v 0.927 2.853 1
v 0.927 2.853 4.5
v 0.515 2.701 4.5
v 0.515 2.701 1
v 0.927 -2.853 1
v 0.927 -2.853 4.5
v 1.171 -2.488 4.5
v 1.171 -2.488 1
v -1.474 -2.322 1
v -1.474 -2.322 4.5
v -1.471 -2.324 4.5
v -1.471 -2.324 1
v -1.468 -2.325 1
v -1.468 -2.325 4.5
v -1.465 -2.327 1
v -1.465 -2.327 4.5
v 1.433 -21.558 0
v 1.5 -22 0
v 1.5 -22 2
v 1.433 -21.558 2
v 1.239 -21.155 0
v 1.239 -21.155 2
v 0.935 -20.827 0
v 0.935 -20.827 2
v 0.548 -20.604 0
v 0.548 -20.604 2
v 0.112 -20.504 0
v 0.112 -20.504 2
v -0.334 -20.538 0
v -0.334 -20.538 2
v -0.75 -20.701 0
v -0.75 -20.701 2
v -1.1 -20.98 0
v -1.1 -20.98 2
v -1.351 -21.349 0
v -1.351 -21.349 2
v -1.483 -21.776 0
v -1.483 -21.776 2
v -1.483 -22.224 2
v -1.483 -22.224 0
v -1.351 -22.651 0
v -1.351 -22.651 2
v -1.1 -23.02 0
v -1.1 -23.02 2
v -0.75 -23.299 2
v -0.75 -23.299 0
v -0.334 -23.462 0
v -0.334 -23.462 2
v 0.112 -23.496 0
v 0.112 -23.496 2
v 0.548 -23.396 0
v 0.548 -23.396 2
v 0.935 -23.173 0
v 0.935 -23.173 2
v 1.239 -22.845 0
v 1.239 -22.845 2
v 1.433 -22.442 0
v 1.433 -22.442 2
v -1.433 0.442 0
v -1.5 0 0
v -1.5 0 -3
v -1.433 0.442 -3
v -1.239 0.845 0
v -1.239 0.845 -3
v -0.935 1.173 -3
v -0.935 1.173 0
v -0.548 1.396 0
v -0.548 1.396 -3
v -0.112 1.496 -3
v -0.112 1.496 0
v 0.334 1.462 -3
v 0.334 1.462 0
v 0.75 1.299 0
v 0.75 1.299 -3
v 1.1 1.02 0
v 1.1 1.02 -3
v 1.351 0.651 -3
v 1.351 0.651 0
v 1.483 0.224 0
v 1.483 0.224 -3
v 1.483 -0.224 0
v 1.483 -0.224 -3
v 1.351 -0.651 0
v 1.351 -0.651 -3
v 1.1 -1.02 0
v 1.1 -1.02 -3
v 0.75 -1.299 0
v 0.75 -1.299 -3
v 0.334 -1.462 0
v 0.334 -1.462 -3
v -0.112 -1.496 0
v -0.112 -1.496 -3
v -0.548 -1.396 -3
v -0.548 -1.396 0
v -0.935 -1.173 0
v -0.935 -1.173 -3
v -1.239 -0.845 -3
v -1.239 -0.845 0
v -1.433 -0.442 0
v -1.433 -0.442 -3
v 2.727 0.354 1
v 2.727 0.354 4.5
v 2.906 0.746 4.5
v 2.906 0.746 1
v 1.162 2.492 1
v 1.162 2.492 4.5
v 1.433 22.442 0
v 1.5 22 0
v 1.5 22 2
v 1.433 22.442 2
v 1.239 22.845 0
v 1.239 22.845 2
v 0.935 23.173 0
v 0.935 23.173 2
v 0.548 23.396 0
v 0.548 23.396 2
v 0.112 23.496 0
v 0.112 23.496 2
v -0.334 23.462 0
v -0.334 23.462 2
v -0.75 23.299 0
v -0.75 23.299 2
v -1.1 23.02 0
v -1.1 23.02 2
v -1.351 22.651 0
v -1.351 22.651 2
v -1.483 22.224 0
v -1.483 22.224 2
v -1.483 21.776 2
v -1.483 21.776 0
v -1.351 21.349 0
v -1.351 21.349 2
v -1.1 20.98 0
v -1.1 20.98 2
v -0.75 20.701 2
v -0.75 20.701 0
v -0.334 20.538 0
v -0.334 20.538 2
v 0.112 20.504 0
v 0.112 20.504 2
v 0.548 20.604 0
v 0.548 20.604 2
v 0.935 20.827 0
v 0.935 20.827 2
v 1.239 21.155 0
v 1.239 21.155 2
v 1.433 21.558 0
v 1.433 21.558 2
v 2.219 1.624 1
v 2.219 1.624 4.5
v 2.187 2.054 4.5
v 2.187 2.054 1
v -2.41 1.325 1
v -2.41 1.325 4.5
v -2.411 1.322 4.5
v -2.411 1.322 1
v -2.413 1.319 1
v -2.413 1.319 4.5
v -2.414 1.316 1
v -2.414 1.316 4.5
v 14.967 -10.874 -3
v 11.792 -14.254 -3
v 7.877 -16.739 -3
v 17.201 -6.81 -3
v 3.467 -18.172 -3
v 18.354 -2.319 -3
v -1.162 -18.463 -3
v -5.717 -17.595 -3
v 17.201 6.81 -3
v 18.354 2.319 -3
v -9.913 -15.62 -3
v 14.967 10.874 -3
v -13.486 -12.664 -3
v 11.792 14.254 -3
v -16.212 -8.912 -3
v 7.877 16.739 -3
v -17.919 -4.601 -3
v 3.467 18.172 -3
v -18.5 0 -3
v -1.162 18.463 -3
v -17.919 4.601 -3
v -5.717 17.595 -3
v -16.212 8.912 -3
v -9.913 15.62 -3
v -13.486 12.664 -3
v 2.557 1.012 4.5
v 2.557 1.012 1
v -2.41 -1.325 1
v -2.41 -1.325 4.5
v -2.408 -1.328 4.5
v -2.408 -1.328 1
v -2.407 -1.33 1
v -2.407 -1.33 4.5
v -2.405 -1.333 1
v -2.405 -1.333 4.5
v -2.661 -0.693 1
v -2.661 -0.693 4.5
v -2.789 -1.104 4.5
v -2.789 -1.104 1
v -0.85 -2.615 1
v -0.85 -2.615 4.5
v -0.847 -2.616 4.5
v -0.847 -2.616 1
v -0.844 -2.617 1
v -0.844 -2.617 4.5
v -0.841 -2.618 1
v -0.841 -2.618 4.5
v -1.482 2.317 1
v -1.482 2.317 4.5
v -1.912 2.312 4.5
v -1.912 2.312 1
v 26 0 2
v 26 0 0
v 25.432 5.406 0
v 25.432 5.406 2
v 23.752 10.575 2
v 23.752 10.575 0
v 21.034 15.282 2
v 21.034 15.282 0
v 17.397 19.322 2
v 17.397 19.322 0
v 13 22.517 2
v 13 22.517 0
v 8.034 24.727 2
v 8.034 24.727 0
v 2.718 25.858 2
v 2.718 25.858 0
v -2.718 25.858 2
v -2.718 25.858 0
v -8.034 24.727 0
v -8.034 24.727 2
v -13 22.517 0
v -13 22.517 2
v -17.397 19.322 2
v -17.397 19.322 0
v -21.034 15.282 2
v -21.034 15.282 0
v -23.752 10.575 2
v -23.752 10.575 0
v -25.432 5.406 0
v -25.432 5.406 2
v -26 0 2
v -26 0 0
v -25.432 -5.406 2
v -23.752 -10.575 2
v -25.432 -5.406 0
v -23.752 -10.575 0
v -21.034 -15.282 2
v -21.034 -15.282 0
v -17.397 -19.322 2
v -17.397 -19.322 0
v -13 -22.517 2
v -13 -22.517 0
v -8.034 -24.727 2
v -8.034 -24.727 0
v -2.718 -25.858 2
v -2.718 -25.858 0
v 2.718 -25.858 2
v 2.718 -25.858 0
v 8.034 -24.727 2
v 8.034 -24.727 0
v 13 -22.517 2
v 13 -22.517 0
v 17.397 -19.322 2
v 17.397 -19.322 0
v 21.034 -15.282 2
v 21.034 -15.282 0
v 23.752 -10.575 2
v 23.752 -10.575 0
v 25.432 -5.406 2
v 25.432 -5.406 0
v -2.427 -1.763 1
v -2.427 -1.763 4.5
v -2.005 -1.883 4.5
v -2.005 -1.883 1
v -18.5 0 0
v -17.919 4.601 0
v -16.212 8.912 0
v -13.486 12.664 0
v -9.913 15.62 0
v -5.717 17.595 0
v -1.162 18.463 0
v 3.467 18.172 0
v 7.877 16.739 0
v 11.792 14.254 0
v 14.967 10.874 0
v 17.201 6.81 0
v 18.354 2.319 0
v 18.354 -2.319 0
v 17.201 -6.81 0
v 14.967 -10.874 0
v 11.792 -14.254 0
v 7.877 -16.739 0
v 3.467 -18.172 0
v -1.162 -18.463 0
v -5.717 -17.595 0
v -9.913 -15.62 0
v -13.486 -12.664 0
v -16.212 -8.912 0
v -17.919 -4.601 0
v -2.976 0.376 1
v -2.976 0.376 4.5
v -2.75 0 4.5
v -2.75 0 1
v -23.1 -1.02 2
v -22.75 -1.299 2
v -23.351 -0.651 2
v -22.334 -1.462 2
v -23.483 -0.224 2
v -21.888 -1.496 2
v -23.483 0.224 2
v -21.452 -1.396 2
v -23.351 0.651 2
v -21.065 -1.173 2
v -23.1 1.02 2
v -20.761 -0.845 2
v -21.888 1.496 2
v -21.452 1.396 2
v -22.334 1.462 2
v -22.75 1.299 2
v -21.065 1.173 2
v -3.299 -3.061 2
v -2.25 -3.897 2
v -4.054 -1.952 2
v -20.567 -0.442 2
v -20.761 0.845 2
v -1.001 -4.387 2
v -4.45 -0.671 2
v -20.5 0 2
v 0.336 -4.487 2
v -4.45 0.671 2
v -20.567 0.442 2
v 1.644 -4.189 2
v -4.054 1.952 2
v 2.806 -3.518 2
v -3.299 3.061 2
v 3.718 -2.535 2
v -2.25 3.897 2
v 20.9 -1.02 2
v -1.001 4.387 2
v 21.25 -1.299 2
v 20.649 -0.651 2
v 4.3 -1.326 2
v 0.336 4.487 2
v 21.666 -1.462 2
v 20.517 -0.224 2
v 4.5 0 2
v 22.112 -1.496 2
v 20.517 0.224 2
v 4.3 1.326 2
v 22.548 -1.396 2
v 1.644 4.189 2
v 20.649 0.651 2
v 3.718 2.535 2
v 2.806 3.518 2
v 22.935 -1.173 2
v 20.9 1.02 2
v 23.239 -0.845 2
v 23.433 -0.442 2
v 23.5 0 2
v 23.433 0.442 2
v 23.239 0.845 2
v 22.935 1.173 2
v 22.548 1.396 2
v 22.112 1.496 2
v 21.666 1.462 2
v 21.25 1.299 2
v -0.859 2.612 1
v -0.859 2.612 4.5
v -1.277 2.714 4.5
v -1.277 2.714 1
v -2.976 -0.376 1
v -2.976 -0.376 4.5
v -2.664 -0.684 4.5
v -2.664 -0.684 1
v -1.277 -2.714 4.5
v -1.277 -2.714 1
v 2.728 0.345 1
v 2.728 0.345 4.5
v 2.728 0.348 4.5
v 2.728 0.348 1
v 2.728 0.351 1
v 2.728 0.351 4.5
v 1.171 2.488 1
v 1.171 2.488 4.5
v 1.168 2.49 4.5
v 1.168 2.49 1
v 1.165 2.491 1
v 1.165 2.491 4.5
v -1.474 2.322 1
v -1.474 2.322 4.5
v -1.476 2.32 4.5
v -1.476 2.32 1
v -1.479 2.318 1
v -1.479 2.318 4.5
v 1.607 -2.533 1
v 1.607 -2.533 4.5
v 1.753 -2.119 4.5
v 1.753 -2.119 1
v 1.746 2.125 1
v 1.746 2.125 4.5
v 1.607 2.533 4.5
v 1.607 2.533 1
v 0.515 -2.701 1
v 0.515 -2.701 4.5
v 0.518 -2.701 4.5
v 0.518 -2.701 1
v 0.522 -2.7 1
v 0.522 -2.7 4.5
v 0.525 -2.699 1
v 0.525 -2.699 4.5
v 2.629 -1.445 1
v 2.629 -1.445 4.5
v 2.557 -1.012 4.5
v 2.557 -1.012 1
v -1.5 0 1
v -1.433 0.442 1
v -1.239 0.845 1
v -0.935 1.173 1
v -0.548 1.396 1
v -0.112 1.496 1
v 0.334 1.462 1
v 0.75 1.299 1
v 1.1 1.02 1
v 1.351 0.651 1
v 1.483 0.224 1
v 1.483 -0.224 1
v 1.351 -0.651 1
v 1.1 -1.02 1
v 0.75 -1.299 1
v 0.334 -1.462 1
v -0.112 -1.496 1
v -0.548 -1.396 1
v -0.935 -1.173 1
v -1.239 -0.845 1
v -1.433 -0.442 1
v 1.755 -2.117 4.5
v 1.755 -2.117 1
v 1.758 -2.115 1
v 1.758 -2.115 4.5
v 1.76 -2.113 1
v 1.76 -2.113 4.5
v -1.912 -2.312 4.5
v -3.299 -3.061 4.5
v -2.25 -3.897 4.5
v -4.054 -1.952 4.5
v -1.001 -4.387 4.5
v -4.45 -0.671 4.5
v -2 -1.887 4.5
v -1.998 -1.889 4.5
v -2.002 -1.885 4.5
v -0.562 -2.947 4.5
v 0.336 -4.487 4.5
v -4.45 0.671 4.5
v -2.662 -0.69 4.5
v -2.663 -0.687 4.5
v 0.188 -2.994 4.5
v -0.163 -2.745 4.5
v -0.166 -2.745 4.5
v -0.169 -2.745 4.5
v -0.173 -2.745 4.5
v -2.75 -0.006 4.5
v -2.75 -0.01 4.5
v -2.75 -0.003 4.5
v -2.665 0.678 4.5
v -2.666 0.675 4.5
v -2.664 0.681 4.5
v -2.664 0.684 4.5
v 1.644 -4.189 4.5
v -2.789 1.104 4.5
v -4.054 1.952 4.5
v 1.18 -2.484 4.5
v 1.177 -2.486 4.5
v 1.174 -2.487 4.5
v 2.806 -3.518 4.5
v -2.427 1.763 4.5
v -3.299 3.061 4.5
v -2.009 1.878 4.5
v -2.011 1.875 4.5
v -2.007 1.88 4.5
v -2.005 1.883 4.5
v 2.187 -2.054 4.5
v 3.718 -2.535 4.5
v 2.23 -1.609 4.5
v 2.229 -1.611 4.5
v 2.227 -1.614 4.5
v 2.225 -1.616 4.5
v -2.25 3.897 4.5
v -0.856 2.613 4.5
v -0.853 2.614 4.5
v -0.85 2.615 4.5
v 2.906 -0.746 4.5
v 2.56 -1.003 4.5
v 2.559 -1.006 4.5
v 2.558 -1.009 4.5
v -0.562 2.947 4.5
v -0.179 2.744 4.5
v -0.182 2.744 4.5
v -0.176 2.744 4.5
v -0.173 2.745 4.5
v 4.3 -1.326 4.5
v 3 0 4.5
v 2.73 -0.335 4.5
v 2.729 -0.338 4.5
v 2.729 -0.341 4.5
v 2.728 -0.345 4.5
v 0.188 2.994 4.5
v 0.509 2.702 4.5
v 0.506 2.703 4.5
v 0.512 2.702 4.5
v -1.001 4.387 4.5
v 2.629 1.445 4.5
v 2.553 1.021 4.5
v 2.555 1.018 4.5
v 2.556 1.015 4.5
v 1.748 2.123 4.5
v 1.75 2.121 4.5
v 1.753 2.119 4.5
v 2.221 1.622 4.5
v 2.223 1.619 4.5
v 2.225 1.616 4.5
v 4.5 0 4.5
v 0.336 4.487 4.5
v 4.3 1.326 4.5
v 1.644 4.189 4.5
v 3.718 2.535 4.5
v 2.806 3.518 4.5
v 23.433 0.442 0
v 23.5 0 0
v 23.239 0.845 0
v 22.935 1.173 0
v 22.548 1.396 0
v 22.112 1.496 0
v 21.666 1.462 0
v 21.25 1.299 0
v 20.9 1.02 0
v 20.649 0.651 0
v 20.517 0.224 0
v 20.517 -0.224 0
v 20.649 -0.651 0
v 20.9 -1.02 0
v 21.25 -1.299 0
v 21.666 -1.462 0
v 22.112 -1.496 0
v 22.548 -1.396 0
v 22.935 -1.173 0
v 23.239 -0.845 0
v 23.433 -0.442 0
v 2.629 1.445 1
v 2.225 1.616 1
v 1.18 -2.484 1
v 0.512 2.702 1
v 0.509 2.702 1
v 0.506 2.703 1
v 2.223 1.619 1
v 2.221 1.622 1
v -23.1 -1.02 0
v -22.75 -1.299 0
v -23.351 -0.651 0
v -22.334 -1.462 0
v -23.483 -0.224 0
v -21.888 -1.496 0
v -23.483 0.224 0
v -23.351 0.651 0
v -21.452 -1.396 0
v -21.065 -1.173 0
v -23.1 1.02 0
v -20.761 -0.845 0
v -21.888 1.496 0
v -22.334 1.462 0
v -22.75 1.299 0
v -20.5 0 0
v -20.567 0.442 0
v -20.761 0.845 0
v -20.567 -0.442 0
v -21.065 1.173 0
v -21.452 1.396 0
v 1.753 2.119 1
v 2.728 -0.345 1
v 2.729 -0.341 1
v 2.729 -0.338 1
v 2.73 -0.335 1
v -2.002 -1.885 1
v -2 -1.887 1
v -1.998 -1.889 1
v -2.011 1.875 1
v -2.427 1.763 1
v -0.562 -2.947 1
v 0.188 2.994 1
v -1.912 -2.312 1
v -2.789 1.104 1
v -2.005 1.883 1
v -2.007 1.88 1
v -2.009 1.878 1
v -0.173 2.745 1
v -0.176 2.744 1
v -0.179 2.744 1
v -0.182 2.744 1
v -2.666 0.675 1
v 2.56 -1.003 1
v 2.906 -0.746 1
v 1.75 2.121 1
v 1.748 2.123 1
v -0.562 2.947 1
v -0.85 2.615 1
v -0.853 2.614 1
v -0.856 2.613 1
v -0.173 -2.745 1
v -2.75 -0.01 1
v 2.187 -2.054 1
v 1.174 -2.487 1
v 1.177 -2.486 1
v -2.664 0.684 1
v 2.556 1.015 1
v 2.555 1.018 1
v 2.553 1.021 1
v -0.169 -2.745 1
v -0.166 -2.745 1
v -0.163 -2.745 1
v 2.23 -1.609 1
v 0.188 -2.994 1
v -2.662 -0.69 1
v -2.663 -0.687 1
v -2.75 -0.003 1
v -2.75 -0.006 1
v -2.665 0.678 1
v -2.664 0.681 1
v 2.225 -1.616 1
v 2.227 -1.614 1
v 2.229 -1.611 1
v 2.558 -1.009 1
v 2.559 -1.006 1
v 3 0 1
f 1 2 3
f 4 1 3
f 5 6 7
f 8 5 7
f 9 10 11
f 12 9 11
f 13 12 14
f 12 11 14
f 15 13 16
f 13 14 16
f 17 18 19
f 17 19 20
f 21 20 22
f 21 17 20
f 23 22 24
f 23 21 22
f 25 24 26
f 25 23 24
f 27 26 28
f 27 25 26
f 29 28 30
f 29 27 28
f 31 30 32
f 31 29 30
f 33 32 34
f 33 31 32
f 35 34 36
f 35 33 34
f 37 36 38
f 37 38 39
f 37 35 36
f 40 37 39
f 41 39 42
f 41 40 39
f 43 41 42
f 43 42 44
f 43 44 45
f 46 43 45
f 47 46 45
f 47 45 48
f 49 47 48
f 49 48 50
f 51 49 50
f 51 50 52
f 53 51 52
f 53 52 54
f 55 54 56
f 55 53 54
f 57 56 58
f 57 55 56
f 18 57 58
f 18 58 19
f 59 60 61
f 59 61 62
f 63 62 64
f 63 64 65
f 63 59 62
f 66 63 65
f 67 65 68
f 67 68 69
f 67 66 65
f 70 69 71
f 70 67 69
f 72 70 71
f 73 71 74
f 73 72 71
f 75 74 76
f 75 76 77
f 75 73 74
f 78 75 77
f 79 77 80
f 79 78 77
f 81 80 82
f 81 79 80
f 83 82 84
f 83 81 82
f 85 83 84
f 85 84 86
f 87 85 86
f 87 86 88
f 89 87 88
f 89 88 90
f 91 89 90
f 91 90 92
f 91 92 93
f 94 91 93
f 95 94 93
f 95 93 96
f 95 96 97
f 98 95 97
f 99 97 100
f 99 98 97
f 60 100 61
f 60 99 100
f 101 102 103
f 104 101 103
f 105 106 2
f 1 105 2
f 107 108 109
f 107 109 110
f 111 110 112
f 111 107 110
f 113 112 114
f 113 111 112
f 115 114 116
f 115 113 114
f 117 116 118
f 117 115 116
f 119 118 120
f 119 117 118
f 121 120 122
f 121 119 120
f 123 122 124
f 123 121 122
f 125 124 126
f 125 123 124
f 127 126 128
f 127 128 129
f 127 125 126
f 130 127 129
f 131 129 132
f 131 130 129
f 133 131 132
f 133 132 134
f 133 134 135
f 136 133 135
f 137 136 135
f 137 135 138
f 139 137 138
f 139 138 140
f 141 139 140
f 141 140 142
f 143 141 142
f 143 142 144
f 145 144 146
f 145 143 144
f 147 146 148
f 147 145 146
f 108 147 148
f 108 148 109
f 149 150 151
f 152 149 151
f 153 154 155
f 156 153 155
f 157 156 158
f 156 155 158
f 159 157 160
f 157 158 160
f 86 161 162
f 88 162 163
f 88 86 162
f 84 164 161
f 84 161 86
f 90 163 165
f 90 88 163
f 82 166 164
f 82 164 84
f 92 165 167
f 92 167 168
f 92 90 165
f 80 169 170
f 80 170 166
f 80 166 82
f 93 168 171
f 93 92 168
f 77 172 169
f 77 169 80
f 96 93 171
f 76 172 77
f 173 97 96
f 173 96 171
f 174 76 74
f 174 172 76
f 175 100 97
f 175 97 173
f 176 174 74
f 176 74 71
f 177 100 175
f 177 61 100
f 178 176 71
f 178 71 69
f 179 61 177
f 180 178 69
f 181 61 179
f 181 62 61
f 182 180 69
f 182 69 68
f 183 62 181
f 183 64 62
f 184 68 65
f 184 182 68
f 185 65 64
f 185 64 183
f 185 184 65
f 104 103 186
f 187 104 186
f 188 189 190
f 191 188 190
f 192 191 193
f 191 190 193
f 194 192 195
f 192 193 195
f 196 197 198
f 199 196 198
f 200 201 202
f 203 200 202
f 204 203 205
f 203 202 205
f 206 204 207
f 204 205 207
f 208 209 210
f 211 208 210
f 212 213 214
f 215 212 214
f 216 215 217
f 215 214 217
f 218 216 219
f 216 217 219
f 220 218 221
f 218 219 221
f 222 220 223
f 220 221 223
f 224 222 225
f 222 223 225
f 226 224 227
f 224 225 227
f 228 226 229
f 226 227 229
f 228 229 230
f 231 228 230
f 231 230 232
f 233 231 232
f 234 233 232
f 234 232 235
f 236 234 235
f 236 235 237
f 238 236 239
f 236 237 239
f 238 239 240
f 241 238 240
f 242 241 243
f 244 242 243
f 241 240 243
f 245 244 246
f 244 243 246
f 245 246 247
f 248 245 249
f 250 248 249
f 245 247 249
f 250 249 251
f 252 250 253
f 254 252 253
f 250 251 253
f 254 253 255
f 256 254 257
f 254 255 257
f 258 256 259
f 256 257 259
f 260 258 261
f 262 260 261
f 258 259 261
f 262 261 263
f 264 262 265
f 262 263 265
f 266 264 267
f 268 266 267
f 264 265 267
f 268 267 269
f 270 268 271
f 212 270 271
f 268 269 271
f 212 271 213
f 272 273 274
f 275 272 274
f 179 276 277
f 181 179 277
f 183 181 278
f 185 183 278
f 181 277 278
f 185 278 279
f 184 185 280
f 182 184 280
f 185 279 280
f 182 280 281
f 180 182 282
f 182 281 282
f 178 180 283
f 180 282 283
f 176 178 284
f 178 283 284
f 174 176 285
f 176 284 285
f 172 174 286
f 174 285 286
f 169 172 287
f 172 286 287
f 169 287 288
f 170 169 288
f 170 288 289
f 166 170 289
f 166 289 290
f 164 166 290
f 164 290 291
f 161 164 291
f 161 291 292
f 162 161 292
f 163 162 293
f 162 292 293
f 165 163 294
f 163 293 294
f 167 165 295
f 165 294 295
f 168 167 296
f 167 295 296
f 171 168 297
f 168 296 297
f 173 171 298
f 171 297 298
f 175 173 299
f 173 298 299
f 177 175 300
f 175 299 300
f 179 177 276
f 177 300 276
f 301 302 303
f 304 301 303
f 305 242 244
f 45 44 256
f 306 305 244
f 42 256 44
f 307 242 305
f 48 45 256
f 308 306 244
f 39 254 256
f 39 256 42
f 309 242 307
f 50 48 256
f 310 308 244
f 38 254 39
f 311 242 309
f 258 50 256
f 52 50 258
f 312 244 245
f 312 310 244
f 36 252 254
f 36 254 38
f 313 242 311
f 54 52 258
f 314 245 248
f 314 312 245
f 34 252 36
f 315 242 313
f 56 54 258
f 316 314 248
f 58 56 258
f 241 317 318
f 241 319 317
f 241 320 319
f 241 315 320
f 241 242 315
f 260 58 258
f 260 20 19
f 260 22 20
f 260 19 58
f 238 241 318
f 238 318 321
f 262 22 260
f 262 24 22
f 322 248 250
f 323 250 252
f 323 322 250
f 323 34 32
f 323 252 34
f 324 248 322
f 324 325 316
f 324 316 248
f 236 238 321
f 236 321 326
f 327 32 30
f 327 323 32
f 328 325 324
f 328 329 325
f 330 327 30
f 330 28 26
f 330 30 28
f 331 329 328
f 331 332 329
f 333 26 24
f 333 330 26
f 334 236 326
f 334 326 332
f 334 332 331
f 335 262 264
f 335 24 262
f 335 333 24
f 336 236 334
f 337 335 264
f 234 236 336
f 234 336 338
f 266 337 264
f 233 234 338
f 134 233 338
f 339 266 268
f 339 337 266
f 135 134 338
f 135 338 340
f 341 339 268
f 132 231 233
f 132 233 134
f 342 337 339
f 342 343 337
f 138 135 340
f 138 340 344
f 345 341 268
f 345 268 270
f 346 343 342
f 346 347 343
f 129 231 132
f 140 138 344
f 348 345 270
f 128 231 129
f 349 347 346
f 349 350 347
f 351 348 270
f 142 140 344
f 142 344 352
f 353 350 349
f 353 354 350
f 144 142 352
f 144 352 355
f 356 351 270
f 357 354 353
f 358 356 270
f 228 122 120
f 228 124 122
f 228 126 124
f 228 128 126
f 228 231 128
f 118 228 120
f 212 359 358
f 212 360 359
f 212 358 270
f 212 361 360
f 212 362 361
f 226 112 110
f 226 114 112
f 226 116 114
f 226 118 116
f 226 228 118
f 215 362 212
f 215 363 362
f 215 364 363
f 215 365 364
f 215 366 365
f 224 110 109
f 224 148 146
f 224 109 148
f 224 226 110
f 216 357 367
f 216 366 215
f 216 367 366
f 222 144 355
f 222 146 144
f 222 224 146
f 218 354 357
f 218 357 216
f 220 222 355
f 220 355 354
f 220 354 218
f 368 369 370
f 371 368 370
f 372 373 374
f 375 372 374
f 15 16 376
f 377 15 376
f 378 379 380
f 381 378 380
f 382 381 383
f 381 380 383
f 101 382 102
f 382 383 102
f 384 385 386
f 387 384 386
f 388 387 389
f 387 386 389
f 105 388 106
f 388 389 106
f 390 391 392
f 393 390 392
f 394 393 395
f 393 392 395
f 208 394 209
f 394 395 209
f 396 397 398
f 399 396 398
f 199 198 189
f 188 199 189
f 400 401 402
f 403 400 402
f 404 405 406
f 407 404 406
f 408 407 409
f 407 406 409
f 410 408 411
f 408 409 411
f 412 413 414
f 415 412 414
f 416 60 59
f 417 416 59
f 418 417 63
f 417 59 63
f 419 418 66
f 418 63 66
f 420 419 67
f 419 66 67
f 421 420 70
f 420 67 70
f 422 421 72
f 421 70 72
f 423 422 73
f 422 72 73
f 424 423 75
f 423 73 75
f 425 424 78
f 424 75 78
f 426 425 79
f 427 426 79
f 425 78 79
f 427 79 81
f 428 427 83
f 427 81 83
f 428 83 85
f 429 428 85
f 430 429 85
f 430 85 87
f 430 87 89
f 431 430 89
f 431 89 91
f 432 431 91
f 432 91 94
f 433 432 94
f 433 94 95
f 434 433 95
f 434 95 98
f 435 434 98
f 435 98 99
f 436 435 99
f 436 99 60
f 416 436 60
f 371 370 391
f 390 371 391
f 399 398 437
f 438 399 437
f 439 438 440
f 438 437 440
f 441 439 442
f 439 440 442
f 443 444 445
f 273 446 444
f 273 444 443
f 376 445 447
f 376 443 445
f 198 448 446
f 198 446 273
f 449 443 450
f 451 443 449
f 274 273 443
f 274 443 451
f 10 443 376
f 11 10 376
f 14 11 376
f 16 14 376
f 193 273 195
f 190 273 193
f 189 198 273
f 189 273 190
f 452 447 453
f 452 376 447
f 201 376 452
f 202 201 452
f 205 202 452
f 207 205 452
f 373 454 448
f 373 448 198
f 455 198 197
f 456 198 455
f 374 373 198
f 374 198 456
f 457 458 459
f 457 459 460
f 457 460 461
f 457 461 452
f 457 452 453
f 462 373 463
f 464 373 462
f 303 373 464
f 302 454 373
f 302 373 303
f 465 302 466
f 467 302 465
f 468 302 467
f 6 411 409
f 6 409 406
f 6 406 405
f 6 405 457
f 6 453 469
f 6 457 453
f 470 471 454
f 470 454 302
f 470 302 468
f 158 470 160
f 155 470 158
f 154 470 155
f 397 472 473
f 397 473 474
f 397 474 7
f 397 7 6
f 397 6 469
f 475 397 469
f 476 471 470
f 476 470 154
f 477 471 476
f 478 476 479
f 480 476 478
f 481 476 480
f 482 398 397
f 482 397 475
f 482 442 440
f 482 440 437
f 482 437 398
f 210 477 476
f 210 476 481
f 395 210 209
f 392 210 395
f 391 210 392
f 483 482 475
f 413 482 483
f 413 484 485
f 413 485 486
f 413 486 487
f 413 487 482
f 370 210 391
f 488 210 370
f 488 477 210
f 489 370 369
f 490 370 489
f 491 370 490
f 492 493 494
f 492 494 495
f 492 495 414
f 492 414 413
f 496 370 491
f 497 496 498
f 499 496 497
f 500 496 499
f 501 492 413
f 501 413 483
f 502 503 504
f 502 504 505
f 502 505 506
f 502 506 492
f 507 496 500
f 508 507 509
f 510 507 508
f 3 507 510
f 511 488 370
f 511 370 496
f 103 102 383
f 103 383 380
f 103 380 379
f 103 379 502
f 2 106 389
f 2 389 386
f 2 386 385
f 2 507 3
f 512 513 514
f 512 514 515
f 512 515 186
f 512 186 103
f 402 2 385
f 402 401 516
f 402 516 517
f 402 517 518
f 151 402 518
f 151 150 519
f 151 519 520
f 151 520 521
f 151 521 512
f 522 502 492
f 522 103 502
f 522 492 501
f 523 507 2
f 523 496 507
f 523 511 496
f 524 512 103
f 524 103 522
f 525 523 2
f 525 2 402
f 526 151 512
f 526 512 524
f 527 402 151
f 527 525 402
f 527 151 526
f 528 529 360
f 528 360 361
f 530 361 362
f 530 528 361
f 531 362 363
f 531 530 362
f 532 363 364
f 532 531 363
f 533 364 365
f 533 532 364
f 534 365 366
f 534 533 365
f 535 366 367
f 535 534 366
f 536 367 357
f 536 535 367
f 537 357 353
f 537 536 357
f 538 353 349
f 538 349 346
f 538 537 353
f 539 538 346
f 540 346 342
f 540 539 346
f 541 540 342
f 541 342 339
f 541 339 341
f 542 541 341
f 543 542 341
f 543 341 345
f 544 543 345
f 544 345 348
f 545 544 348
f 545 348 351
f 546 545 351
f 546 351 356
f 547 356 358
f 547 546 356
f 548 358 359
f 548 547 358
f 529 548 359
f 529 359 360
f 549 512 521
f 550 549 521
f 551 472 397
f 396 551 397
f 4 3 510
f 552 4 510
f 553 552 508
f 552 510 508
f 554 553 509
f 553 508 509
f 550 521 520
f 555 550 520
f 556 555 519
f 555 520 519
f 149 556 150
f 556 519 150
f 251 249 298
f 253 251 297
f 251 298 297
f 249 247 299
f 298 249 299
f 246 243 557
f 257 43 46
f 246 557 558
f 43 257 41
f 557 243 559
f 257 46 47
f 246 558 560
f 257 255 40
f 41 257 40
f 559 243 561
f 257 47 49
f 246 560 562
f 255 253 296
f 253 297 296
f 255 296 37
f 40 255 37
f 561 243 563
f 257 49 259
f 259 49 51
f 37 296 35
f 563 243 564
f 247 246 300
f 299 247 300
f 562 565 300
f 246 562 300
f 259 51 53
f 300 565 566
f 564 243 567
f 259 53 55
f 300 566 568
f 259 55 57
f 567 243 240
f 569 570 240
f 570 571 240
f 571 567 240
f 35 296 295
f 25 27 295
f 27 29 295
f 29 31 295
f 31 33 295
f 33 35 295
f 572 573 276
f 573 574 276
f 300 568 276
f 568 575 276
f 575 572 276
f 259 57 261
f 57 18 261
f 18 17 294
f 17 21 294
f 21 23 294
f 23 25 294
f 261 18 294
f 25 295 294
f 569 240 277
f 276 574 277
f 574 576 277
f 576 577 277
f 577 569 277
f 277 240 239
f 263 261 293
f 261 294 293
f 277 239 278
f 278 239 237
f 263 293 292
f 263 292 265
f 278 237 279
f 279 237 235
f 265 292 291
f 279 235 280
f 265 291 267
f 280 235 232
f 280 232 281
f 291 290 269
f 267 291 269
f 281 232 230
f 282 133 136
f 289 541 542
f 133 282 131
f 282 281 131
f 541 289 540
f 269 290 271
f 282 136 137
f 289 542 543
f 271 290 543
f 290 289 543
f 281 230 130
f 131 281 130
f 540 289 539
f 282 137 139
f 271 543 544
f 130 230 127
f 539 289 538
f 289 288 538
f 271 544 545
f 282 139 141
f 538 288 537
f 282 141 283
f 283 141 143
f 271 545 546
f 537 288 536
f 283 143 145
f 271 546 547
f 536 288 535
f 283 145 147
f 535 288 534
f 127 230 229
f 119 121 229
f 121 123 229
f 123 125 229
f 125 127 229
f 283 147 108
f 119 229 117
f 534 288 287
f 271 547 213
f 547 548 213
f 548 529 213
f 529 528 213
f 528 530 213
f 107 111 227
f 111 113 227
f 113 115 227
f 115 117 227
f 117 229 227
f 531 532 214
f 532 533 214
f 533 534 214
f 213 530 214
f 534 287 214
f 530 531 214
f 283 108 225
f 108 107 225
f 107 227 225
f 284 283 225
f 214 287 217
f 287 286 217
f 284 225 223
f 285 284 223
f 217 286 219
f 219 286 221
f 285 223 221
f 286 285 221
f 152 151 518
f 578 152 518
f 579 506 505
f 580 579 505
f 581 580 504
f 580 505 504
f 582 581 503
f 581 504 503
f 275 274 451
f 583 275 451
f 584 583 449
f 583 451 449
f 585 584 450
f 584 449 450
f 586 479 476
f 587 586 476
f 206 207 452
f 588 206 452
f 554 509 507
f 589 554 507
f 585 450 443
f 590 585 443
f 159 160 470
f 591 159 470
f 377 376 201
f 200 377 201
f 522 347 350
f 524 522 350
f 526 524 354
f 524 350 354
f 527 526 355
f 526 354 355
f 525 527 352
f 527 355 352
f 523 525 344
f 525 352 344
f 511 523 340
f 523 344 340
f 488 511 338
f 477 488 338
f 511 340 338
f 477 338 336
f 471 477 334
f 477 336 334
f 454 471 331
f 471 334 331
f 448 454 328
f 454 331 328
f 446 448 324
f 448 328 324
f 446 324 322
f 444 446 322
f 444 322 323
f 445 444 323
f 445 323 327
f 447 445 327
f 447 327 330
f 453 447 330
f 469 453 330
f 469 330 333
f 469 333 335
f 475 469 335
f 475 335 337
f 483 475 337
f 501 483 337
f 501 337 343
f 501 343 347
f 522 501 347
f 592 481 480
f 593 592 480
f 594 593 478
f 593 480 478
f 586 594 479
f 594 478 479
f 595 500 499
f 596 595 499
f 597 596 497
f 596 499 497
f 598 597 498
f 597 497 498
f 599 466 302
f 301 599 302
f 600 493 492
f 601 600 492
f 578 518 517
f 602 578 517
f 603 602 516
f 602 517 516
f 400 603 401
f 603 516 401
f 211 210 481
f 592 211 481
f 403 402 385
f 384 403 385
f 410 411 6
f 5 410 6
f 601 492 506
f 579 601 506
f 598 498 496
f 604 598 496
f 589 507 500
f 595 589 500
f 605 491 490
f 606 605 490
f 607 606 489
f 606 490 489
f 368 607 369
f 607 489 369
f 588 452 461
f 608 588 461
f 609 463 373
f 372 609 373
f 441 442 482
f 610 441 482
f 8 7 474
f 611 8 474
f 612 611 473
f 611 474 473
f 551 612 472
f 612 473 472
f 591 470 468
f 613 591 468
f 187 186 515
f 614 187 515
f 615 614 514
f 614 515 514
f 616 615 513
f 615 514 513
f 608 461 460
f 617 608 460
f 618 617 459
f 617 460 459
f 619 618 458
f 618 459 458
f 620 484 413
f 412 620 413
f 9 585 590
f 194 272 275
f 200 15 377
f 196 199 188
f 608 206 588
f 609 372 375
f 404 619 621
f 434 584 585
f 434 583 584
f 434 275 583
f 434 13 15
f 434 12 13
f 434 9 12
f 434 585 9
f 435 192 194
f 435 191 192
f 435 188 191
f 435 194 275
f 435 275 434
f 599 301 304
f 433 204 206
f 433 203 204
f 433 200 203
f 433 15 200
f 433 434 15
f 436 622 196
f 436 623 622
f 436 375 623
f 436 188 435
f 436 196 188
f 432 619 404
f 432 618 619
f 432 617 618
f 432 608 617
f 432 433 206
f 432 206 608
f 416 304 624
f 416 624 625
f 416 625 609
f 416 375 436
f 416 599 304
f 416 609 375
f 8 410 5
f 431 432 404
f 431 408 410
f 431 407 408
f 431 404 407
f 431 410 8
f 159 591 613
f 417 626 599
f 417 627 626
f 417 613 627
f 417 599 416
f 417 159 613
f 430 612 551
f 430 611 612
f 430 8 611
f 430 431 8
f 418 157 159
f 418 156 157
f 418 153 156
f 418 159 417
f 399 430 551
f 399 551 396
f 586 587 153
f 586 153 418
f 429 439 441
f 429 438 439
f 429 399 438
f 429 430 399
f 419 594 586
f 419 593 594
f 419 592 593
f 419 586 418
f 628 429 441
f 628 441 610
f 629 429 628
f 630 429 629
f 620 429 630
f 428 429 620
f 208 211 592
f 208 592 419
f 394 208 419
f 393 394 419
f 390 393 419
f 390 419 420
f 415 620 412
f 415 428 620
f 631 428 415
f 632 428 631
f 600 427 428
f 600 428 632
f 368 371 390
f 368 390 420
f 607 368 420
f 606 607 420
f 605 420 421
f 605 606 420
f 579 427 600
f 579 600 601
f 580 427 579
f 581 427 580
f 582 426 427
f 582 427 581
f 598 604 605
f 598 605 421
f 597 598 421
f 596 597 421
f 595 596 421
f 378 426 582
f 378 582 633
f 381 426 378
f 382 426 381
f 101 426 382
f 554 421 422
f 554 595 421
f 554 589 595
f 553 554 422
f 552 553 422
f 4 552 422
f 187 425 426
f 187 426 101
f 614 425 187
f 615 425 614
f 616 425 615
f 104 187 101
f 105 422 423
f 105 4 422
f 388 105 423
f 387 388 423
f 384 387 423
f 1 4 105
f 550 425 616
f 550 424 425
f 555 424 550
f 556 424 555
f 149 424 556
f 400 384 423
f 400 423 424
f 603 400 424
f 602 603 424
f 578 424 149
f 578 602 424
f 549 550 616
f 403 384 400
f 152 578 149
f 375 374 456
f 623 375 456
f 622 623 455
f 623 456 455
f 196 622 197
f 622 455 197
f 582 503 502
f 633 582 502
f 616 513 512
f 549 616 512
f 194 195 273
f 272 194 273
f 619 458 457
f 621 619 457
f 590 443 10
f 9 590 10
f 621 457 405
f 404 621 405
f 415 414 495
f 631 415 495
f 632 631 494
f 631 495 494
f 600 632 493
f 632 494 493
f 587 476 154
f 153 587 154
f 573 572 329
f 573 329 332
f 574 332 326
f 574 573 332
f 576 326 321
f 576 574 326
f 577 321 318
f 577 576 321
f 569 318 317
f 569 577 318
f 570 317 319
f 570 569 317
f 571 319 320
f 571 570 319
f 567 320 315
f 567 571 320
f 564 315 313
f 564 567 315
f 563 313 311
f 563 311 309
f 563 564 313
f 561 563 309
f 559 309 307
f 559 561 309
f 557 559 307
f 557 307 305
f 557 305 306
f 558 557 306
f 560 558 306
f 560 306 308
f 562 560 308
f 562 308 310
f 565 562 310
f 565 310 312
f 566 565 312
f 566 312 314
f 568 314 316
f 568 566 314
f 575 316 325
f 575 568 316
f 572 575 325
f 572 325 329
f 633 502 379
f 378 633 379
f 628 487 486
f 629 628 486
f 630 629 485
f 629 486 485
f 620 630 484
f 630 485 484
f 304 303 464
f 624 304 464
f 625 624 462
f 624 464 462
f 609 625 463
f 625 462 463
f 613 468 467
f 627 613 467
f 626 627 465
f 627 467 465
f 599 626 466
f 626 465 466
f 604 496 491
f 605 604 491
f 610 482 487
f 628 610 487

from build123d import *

# Parameters (mm, degrees)
SKETCH1_R           = 26
SKETCH1_R_2         = 1.5
SKETCH1_R_3         = 4.5
BOSS_EXTRUDE1_DEPTH = 2
SKETCH1_2_R         = 4.5
BOSS_EXTRUDE2_DEPTH = 4.5
SKETCH2_R           = 1.5
CUT_EXTRUDE1_DEPTH  = 4.5
SKETCH3_R           = 2.75
CUT_EXTRUDE2_DEPTH  = 3.5
CUT_EXTRUDE3_DEPTH  = 3.5
CIRPATTERN1_COUNT   = 25
BOSS_EXTRUDE3_START = 3
SKETCH5_R           = 18.5
SKETCH5_R_2         = 1.5
BOSS_EXTRUDE3_DEPTH = 3


with BuildPart() as part:
    # Sketch1 → Boss-Extrude1 (new body)
    with BuildSketch(Plane.XY):
        Circle(SKETCH1_R)
        with Locations((0, 22)):
            Circle(SKETCH1_R_2, mode=Mode.SUBTRACT)
        with Locations((22, 0)):
            Circle(SKETCH1_R_2, mode=Mode.SUBTRACT)
        with Locations((0, -22)):
            Circle(SKETCH1_R_2, mode=Mode.SUBTRACT)
        with Locations((-22, 0)):
            Circle(SKETCH1_R_2, mode=Mode.SUBTRACT)
        Circle(SKETCH1_R_3, mode=Mode.SUBTRACT)
    extrude(amount=BOSS_EXTRUDE1_DEPTH)

    # Sketch1<2> → Boss-Extrude2 (add)
    with BuildSketch(Plane.XY):
        Circle(SKETCH1_2_R)
    extrude(amount=BOSS_EXTRUDE2_DEPTH)

    # Sketch2 → Cut-Extrude1 (cut)
    with BuildSketch(Plane(origin=(0, 0, 0), x_dir=(-1, 0, 0), z_dir=(0, 0, -1))):
        Circle(SKETCH2_R)
    extrude(amount=-CUT_EXTRUDE1_DEPTH, mode=Mode.SUBTRACT)

    # Sketch3 → Cut-Extrude2 (cut)
    with BuildSketch(Plane.XY.offset(4.5)):
        Circle(SKETCH3_R)
    extrude(amount=-CUT_EXTRUDE2_DEPTH, mode=Mode.SUBTRACT)

    # Sketch4 → Cut-Extrude3 (cut)
    with BuildSketch(Plane.XY.offset(4.5)):
        with BuildLine():
            Line((-2.976344104, 0.375999701), (-2.75, 0))
            ThreePointArc((-2.75, 0), (-2.728912829, 0.339904061), (-2.665974712, 0.674595311))
            Line((-2.665974712, 0.674595311), (-2.976344104, 0.375999701))
        make_face()
    cut_extrude3 = extrude(amount=-CUT_EXTRUDE3_DEPTH, mode=Mode.SUBTRACT)

    # CirPattern1: Cut-Extrude3 ×25 about axis
    cirpattern1_axis = Axis((0, 0, 4.5), (0, 0, -1))
    for i in range(1, CIRPATTERN1_COUNT):
        add(cut_extrude3.rotate(cirpattern1_axis, i * 360 / CIRPATTERN1_COUNT), mode=Mode.SUBTRACT)

    # Sketch5 → Boss-Extrude3 (add)
    with BuildSketch(Plane(origin=(0, 0, 0), x_dir=(-1, 0, 0), z_dir=(0, 0, -1)).offset(BOSS_EXTRUDE3_START)):
        Circle(SKETCH5_R)
        Circle(SKETCH5_R_2, mode=Mode.SUBTRACT)
    extrude(amount=-BOSS_EXTRUDE3_DEPTH)


solid = part.part
